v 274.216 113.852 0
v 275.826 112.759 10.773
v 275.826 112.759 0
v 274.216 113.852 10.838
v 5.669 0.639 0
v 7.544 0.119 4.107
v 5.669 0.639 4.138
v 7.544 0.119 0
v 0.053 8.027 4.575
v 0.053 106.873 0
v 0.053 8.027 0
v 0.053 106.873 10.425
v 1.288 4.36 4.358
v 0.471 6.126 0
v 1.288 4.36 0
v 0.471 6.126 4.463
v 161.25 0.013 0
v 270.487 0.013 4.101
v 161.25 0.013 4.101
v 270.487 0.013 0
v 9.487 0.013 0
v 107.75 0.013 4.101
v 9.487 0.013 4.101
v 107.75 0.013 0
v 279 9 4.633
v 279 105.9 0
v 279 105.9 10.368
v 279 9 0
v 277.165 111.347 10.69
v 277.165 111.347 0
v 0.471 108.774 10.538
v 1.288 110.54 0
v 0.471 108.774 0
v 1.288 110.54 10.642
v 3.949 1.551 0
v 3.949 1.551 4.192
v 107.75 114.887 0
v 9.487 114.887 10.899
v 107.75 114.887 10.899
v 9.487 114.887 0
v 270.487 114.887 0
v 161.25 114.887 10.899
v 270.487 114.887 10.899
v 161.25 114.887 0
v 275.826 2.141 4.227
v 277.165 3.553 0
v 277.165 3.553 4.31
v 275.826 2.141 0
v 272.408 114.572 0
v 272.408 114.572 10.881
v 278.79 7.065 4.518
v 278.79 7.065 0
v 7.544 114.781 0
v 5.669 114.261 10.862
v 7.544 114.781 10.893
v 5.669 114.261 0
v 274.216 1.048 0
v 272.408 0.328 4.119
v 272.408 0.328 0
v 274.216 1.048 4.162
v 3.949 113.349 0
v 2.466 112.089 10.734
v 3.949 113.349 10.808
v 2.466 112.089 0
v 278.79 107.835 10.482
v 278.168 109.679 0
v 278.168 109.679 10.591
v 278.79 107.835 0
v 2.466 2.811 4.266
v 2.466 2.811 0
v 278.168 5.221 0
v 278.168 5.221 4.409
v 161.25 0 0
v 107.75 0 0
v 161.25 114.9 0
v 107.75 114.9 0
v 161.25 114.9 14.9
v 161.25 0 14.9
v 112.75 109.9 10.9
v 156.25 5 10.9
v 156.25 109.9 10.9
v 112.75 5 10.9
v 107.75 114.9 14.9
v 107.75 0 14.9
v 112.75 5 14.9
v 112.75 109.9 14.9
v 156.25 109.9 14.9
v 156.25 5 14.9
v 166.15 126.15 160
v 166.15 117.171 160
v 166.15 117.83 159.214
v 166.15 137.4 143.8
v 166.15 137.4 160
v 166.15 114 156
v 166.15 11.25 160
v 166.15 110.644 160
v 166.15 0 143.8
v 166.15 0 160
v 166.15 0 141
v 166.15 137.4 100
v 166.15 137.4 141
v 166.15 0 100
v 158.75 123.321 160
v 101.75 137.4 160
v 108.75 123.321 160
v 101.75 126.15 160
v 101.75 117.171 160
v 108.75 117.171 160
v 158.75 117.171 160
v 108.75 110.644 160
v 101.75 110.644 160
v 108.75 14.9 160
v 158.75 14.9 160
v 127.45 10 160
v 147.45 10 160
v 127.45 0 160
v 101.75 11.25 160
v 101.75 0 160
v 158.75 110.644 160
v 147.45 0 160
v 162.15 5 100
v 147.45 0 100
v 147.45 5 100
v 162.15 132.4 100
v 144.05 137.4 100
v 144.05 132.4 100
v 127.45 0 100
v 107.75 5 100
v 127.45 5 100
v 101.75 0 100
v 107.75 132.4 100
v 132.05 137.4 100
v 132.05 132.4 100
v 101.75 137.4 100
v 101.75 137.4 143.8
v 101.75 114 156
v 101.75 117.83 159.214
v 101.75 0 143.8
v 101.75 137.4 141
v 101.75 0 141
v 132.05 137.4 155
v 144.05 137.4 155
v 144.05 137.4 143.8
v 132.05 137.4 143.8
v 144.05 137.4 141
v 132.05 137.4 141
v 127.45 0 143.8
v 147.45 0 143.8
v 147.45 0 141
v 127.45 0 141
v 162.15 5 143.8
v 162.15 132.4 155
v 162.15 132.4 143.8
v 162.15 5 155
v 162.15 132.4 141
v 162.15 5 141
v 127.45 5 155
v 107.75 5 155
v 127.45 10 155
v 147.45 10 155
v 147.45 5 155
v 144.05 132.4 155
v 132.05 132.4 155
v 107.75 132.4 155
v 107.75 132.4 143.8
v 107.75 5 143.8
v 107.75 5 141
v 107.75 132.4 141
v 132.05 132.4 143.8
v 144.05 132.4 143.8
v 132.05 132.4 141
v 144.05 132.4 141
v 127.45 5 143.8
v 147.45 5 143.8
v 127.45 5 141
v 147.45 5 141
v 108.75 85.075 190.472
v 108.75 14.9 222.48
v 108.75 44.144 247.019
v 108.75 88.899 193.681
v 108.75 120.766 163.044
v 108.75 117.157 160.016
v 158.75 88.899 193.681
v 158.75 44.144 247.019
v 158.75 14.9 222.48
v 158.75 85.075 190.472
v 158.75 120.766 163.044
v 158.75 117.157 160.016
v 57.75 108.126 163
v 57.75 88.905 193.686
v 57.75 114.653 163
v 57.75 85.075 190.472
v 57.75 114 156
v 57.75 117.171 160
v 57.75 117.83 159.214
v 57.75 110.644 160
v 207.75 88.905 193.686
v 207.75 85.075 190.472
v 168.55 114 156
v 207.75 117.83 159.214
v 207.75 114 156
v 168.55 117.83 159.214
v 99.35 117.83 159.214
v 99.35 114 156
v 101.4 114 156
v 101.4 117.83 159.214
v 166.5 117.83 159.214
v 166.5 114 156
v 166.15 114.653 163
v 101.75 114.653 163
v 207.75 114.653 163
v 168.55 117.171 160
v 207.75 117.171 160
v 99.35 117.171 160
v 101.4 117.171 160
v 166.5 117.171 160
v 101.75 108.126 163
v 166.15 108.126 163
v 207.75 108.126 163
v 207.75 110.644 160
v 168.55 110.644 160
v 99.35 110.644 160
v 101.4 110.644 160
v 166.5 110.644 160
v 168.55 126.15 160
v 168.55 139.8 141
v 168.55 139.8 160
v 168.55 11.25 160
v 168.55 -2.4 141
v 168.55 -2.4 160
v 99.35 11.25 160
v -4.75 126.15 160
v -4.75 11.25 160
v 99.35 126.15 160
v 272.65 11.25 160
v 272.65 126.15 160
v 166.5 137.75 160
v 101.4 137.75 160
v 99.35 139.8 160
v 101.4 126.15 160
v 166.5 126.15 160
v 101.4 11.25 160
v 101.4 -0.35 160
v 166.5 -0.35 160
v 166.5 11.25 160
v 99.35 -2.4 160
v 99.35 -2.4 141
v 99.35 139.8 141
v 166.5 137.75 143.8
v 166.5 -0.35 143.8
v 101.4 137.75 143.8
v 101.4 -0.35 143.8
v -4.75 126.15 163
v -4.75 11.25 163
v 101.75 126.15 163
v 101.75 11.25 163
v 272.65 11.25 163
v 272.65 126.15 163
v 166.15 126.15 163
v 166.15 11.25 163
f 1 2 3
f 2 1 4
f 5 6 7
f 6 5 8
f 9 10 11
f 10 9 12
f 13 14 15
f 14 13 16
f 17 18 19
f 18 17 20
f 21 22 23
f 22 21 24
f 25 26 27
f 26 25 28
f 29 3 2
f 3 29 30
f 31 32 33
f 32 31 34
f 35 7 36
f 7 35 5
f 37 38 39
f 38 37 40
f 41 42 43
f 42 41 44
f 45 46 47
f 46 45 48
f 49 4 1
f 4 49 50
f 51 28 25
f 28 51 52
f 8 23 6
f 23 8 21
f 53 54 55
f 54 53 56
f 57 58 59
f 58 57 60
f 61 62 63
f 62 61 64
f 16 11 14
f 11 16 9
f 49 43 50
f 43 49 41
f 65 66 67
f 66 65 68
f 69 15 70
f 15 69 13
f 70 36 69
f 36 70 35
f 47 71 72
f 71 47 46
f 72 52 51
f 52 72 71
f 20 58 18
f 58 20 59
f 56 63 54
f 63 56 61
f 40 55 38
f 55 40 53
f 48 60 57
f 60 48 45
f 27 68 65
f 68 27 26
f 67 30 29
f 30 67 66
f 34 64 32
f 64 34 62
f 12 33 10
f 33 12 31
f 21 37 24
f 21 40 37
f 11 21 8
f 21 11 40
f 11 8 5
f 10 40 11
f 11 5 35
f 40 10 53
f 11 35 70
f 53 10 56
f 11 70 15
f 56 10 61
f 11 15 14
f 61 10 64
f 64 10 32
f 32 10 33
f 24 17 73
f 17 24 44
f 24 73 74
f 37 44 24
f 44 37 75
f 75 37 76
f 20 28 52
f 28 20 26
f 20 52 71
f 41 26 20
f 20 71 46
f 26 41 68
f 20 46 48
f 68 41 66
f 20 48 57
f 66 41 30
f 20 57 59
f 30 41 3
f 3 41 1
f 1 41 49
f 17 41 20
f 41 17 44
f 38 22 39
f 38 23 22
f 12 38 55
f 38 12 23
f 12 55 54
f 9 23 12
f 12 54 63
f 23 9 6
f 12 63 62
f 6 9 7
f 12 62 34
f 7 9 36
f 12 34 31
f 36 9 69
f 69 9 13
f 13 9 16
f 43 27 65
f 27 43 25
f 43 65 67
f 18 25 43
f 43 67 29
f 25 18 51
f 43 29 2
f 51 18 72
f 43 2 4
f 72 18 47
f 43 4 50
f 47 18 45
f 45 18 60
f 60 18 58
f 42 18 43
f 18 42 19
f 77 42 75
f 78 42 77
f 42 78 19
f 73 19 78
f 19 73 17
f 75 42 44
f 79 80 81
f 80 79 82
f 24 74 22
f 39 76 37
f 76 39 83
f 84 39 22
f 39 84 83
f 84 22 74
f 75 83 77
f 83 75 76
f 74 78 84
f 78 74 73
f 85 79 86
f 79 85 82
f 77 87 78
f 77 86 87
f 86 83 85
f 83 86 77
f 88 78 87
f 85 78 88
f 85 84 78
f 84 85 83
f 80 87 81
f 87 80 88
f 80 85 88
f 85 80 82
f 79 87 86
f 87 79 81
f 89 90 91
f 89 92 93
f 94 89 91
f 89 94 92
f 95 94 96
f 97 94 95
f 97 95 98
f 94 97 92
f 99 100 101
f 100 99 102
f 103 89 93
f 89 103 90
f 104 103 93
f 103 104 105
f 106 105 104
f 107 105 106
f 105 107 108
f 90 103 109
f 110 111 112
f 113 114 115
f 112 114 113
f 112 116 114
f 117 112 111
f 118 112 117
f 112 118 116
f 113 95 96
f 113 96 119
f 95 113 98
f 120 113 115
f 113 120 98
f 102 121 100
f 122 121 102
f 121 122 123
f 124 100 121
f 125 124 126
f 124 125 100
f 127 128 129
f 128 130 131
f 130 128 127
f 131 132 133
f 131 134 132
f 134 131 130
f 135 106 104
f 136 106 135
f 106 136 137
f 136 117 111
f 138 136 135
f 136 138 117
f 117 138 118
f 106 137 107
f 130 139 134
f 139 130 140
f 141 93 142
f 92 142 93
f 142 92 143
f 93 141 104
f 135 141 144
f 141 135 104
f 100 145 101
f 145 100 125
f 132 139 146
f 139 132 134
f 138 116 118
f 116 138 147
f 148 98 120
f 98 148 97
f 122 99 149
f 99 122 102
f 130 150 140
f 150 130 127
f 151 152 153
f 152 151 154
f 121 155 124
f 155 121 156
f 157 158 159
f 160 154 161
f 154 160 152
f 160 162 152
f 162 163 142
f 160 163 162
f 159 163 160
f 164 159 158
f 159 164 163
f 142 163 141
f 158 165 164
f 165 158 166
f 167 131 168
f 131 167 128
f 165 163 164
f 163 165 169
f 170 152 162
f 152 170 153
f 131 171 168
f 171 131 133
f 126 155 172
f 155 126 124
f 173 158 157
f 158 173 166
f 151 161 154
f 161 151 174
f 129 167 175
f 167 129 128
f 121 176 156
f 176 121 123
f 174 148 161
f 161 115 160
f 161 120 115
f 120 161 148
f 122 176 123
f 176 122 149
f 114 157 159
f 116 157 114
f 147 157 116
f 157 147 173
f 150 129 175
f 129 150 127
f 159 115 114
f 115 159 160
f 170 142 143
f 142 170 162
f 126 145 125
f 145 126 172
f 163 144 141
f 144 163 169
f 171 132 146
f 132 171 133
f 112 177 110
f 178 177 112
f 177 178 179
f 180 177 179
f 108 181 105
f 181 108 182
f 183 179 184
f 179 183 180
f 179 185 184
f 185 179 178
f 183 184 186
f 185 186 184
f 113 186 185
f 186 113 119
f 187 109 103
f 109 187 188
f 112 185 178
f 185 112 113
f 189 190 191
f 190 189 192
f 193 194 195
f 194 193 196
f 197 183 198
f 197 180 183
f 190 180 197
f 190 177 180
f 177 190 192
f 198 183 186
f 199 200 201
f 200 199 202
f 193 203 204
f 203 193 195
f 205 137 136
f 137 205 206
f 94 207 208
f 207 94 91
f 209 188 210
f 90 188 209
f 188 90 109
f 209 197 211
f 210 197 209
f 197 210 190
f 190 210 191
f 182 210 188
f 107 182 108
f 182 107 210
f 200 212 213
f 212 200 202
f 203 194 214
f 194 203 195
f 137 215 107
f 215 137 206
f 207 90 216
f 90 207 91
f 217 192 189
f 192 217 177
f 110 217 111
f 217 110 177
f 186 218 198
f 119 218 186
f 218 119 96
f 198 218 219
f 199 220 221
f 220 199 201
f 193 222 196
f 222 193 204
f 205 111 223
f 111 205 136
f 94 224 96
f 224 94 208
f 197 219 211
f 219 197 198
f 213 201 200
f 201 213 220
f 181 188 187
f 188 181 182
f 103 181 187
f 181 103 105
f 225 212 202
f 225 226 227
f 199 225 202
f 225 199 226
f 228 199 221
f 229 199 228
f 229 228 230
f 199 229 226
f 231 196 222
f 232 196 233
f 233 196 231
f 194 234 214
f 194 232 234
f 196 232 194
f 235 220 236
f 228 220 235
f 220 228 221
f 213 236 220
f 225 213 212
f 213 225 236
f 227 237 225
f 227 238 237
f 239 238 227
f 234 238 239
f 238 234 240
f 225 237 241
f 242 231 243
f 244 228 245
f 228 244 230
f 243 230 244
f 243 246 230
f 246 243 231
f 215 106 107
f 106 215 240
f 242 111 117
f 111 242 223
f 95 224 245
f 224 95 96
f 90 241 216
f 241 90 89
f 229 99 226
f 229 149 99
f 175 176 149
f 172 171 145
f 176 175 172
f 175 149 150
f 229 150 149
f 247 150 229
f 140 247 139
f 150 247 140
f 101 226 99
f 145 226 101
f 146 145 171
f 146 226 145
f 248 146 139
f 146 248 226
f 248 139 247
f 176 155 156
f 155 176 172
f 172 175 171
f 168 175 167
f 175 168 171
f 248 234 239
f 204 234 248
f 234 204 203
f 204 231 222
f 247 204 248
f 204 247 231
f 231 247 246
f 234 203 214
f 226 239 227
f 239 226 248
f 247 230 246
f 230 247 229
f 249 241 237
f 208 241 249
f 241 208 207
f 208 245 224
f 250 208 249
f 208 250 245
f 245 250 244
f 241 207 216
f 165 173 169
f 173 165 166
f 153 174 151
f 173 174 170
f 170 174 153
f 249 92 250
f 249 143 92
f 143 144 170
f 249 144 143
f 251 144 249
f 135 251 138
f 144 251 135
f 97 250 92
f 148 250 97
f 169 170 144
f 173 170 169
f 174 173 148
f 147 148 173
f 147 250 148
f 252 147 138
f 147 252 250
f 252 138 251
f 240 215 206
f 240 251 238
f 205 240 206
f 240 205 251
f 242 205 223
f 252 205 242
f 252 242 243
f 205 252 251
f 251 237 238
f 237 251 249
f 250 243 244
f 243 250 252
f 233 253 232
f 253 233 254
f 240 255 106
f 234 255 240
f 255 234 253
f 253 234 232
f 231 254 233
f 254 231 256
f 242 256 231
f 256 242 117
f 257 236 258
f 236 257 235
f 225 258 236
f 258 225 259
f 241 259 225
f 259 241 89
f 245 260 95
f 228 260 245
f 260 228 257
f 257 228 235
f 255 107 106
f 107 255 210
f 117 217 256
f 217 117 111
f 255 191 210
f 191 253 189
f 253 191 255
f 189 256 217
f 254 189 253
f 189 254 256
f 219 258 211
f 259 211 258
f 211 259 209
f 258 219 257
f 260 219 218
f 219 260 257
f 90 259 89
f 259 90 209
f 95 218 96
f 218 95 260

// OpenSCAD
// file: modules/saddle_cap_extension.scad
// ------------------------------
// Saddle-cap tray extension (press-fit add-on)
// ------------------------------

// --- User-tunable parameters ---
press_fit_clearance_mm      = 0.35; // per side; adjust for printer tolerance
cap_wall_mm                 = 2.4;  // side walls thickness
cap_grip_height_mm          = 16;   // how far cap slides down over saddle
cap_top_plate_thickness_mm  = 3;    // thickness of plate under keyboard
wing_depth_mm               = min(keyboard_depth_mm, mac_mini_depth + 10);
wing_extra_each_side_mm     = max(
    40,
    (keyboard_width_mm - (mac_mini_height_full + mac_mini_saddle_wall_width * 2)) / 2 - 6
);
curb_height_mm              = 1.0;  // low side curb height
curb_thickness_mm           = 1.2;  // low side curb thickness

// --- Helper functions for existing saddle bbox ---
function saddle_outer_pos() = [keyboard_middle_offset - 6, 0, 100];
function saddle_outer_size() = [
    mac_mini_height_full + mac_mini_saddle_wall_width * 2 + 0.4 + 10,
    mac_mini_depth + 0.4 + 10,
    60
];

module saddle_cap_tray_extension() {
    S = saddle_outer_size();
    O = saddle_outer_pos();
    cap_top_z = O[2] + S[2];

    // 1) press-fit cap shell
    difference() {
        translate([
            O[0] - cap_wall_mm,
            O[1] - cap_wall_mm,
            cap_top_z - cap_grip_height_mm - cap_top_plate_thickness_mm
        ])
            cube([
                S[0] + 2 * cap_wall_mm,
                S[1] + 2 * cap_wall_mm,
                cap_grip_height_mm + cap_top_plate_thickness_mm
            ]);

        translate([
            O[0] - press_fit_clearance_mm,
            O[1] - press_fit_clearance_mm,
            cap_top_z - cap_grip_height_mm - 0.2
        ])
            cube([
                S[0] + 2 * press_fit_clearance_mm,
                S[1] + 2 * press_fit_clearance_mm,
                cap_grip_height_mm + 0.4
            ]);
    }

    // 2) left and right wings to widen support
    wing_y_start = O[1] + (S[1] - wing_depth_mm) / 2;

    translate([O[0] - wing_extra_each_side_mm, wing_y_start, cap_top_z])
        cube([wing_extra_each_side_mm, wing_depth_mm, cap_top_plate_thickness_mm]);
    translate([O[0] + S[0], wing_y_start, cap_top_z])
        cube([wing_extra_each_side_mm, wing_depth_mm, cap_top_plate_thickness_mm]);

    // 3) optional curbs at far edges
    if (curb_height_mm > 0) {
        translate([O[0] - wing_extra_each_side_mm, wing_y_start, cap_top_z])
            cube([curb_thickness_mm, wing_depth_mm, curb_height_mm]);
        translate([
            O[0] + S[0] + wing_extra_each_side_mm - curb_thickness_mm,
            wing_y_start,
            cap_top_z
        ])
            cube([curb_thickness_mm, wing_depth_mm, curb_height_mm]);
    }
}
// main file
// Mac mini M4 station with Magic Keyboard tray

// keyboard width presets
// keyboard_width_mm = 418.7; // full
keyboard_width_mm = 279;      // tenkeyless

keyboard_depth_mm = 114.9;
keyboard_front_height_mm = 4.1;
keyboard_back_height_mm = 10.9;

keyboard_incline_degrees = 3.387;
keyboard_full_stand_degrees = 40;
keyboard_incline_height_diff = keyboard_back_height_mm - keyboard_front_height_mm;

subtraction_padding_mm = 4;
subtraction_z_offset = keyboard_incline_height_diff + 1.4;
subtraction_x_offset = 0.5;
subtraction_vertical_padding = 2;

corner_radius = 9;
cylinder_height = keyboard_back_height_mm + 0.1;

mac_mini_m4_corner_radius = 18;
mac_mini_side_grille_gap = 4;
mac_mini_height = 43.5;
mac_mini_platform_wall_width = 5;
mac_mini_height_full = 50;
mac_mini_depth = 127;
mac_mini_saddle_wall_width = 2;

keyboard_middle_offset =
    keyboard_width_mm / 2 - mac_mini_height / 2 - mac_mini_platform_wall_width * 2;

PRINT_MAIN_STATION = true;
PRINT_SADDLE_CAP = true;
include <modules/saddle_cap_extension.scad>;

module keyboard_body_with_rounding() {
    hull() {
        translate([corner_radius, corner_radius, 0])
            cylinder(h = cylinder_height, r = corner_radius);
        translate([keyboard_width_mm - corner_radius, corner_radius, 0])
            cylinder(h = cylinder_height, r = corner_radius);
        translate([corner_radius, keyboard_depth_mm - corner_radius, 0])
            cylinder(h = cylinder_height, r = corner_radius);
        translate([keyboard_width_mm - corner_radius, keyboard_depth_mm - corner_radius, 0])
            cylinder(h = cylinder_height, r = corner_radius);
    }
}

module inclined_cutout() {
    translate([-subtraction_x_offset, 0, subtraction_z_offset * 0.5])
        rotate([keyboard_incline_degrees, 0, 0])
        cube([
            keyboard_width_mm + subtraction_padding_mm,
            keyboard_depth_mm + subtraction_padding_mm,
            keyboard_back_height_mm + subtraction_vertical_padding
        ]);
}

module mac_mini_m4_platform() {
    translate([keyboard_middle_offset, 0, 0])
        cube([
            mac_mini_height + mac_mini_platform_wall_width * 2,
            keyboard_depth_mm,
            keyboard_back_height_mm
        ]);
    translate([keyboard_middle_offset, 0, keyboard_back_height_mm])
        cube([mac_mini_platform_wall_width, keyboard_depth_mm, mac_mini_side_grille_gap]);
    translate([
        keyboard_width_mm / 2 + mac_mini_height / 2 - mac_mini_platform_wall_width,
        0,
        keyboard_back_height_mm
    ])
        cube([mac_mini_platform_wall_width, keyboard_depth_mm, mac_mini_side_grille_gap]);
    translate([
        keyboard_width_mm / 2 - mac_mini_height / 2 - mac_mini_platform_wall_width,
        0,
        keyboard_back_height_mm
    ])
        cube([mac_mini_height, mac_mini_platform_wall_width, mac_mini_side_grille_gap]);
    translate([
        keyboard_width_mm / 2 - mac_mini_height / 2 - mac_mini_platform_wall_width,
        keyboard_depth_mm - mac_mini_platform_wall_width,
        keyboard_back_height_mm
    ])
        cube([mac_mini_height, mac_mini_platform_wall_width, mac_mini_side_grille_gap]);
}

module mac_mini_m4_top_saddle() {
    difference() {
        translate([keyboard_middle_offset - 6, 0, 100])
            cube([
                mac_mini_height_full + mac_mini_saddle_wall_width * 2 + 0.4 + 10,
                mac_mini_depth + 0.4 + 10,
                60
            ]);
        translate([keyboard_middle_offset, 5, 80])
            cube([
                mac_mini_height_full + mac_mini_saddle_wall_width * 2 + 0.4,
                mac_mini_depth + 0.4,
                75
            ]);
        translate([keyboard_middle_offset + 22.2 - 2.5, -40, 75]) cube([20, 50, 100]);
        translate([
            keyboard_middle_offset + 36.3 - 12,
            keyboard_depth_mm + mac_mini_platform_wall_width + 10,
            95
        ])
            cube([12, 12, 60]);
    }
}

module keyboard_full_tray() {
    difference() {
        translate([keyboard_middle_offset + 1, 118, 159])
            rotate([90 + keyboard_full_stand_degrees, 0, 0])
            cube([50, keyboard_depth_mm, 100]);
        translate([keyboard_middle_offset - 3, -100, 50])
            cube([55, keyboard_depth_mm, 200]);
        translate([keyboard_middle_offset - 3, 0, 50])
            cube([55, keyboard_depth_mm, 110]);
    }
    translate([keyboard_middle_offset - 50, 114, 156])
        rotate([keyboard_full_stand_degrees, 0, 0]) cube([150, 5, 45]);
    translate([keyboard_middle_offset + 1, 120.15, 156])
        rotate([keyboard_full_stand_degrees, 0, 0]) cube([50, 5, 5]);
}

if (PRINT_MAIN_STATION) {
    difference() {
        keyboard_body_with_rounding();
        inclined_cutout();
    }
    mac_mini_m4_platform();
    mac_mini_m4_top_saddle();
    keyboard_full_tray();
}

if (PRINT_SADDLE_CAP) {
    saddle_cap_tray_extension();
}
